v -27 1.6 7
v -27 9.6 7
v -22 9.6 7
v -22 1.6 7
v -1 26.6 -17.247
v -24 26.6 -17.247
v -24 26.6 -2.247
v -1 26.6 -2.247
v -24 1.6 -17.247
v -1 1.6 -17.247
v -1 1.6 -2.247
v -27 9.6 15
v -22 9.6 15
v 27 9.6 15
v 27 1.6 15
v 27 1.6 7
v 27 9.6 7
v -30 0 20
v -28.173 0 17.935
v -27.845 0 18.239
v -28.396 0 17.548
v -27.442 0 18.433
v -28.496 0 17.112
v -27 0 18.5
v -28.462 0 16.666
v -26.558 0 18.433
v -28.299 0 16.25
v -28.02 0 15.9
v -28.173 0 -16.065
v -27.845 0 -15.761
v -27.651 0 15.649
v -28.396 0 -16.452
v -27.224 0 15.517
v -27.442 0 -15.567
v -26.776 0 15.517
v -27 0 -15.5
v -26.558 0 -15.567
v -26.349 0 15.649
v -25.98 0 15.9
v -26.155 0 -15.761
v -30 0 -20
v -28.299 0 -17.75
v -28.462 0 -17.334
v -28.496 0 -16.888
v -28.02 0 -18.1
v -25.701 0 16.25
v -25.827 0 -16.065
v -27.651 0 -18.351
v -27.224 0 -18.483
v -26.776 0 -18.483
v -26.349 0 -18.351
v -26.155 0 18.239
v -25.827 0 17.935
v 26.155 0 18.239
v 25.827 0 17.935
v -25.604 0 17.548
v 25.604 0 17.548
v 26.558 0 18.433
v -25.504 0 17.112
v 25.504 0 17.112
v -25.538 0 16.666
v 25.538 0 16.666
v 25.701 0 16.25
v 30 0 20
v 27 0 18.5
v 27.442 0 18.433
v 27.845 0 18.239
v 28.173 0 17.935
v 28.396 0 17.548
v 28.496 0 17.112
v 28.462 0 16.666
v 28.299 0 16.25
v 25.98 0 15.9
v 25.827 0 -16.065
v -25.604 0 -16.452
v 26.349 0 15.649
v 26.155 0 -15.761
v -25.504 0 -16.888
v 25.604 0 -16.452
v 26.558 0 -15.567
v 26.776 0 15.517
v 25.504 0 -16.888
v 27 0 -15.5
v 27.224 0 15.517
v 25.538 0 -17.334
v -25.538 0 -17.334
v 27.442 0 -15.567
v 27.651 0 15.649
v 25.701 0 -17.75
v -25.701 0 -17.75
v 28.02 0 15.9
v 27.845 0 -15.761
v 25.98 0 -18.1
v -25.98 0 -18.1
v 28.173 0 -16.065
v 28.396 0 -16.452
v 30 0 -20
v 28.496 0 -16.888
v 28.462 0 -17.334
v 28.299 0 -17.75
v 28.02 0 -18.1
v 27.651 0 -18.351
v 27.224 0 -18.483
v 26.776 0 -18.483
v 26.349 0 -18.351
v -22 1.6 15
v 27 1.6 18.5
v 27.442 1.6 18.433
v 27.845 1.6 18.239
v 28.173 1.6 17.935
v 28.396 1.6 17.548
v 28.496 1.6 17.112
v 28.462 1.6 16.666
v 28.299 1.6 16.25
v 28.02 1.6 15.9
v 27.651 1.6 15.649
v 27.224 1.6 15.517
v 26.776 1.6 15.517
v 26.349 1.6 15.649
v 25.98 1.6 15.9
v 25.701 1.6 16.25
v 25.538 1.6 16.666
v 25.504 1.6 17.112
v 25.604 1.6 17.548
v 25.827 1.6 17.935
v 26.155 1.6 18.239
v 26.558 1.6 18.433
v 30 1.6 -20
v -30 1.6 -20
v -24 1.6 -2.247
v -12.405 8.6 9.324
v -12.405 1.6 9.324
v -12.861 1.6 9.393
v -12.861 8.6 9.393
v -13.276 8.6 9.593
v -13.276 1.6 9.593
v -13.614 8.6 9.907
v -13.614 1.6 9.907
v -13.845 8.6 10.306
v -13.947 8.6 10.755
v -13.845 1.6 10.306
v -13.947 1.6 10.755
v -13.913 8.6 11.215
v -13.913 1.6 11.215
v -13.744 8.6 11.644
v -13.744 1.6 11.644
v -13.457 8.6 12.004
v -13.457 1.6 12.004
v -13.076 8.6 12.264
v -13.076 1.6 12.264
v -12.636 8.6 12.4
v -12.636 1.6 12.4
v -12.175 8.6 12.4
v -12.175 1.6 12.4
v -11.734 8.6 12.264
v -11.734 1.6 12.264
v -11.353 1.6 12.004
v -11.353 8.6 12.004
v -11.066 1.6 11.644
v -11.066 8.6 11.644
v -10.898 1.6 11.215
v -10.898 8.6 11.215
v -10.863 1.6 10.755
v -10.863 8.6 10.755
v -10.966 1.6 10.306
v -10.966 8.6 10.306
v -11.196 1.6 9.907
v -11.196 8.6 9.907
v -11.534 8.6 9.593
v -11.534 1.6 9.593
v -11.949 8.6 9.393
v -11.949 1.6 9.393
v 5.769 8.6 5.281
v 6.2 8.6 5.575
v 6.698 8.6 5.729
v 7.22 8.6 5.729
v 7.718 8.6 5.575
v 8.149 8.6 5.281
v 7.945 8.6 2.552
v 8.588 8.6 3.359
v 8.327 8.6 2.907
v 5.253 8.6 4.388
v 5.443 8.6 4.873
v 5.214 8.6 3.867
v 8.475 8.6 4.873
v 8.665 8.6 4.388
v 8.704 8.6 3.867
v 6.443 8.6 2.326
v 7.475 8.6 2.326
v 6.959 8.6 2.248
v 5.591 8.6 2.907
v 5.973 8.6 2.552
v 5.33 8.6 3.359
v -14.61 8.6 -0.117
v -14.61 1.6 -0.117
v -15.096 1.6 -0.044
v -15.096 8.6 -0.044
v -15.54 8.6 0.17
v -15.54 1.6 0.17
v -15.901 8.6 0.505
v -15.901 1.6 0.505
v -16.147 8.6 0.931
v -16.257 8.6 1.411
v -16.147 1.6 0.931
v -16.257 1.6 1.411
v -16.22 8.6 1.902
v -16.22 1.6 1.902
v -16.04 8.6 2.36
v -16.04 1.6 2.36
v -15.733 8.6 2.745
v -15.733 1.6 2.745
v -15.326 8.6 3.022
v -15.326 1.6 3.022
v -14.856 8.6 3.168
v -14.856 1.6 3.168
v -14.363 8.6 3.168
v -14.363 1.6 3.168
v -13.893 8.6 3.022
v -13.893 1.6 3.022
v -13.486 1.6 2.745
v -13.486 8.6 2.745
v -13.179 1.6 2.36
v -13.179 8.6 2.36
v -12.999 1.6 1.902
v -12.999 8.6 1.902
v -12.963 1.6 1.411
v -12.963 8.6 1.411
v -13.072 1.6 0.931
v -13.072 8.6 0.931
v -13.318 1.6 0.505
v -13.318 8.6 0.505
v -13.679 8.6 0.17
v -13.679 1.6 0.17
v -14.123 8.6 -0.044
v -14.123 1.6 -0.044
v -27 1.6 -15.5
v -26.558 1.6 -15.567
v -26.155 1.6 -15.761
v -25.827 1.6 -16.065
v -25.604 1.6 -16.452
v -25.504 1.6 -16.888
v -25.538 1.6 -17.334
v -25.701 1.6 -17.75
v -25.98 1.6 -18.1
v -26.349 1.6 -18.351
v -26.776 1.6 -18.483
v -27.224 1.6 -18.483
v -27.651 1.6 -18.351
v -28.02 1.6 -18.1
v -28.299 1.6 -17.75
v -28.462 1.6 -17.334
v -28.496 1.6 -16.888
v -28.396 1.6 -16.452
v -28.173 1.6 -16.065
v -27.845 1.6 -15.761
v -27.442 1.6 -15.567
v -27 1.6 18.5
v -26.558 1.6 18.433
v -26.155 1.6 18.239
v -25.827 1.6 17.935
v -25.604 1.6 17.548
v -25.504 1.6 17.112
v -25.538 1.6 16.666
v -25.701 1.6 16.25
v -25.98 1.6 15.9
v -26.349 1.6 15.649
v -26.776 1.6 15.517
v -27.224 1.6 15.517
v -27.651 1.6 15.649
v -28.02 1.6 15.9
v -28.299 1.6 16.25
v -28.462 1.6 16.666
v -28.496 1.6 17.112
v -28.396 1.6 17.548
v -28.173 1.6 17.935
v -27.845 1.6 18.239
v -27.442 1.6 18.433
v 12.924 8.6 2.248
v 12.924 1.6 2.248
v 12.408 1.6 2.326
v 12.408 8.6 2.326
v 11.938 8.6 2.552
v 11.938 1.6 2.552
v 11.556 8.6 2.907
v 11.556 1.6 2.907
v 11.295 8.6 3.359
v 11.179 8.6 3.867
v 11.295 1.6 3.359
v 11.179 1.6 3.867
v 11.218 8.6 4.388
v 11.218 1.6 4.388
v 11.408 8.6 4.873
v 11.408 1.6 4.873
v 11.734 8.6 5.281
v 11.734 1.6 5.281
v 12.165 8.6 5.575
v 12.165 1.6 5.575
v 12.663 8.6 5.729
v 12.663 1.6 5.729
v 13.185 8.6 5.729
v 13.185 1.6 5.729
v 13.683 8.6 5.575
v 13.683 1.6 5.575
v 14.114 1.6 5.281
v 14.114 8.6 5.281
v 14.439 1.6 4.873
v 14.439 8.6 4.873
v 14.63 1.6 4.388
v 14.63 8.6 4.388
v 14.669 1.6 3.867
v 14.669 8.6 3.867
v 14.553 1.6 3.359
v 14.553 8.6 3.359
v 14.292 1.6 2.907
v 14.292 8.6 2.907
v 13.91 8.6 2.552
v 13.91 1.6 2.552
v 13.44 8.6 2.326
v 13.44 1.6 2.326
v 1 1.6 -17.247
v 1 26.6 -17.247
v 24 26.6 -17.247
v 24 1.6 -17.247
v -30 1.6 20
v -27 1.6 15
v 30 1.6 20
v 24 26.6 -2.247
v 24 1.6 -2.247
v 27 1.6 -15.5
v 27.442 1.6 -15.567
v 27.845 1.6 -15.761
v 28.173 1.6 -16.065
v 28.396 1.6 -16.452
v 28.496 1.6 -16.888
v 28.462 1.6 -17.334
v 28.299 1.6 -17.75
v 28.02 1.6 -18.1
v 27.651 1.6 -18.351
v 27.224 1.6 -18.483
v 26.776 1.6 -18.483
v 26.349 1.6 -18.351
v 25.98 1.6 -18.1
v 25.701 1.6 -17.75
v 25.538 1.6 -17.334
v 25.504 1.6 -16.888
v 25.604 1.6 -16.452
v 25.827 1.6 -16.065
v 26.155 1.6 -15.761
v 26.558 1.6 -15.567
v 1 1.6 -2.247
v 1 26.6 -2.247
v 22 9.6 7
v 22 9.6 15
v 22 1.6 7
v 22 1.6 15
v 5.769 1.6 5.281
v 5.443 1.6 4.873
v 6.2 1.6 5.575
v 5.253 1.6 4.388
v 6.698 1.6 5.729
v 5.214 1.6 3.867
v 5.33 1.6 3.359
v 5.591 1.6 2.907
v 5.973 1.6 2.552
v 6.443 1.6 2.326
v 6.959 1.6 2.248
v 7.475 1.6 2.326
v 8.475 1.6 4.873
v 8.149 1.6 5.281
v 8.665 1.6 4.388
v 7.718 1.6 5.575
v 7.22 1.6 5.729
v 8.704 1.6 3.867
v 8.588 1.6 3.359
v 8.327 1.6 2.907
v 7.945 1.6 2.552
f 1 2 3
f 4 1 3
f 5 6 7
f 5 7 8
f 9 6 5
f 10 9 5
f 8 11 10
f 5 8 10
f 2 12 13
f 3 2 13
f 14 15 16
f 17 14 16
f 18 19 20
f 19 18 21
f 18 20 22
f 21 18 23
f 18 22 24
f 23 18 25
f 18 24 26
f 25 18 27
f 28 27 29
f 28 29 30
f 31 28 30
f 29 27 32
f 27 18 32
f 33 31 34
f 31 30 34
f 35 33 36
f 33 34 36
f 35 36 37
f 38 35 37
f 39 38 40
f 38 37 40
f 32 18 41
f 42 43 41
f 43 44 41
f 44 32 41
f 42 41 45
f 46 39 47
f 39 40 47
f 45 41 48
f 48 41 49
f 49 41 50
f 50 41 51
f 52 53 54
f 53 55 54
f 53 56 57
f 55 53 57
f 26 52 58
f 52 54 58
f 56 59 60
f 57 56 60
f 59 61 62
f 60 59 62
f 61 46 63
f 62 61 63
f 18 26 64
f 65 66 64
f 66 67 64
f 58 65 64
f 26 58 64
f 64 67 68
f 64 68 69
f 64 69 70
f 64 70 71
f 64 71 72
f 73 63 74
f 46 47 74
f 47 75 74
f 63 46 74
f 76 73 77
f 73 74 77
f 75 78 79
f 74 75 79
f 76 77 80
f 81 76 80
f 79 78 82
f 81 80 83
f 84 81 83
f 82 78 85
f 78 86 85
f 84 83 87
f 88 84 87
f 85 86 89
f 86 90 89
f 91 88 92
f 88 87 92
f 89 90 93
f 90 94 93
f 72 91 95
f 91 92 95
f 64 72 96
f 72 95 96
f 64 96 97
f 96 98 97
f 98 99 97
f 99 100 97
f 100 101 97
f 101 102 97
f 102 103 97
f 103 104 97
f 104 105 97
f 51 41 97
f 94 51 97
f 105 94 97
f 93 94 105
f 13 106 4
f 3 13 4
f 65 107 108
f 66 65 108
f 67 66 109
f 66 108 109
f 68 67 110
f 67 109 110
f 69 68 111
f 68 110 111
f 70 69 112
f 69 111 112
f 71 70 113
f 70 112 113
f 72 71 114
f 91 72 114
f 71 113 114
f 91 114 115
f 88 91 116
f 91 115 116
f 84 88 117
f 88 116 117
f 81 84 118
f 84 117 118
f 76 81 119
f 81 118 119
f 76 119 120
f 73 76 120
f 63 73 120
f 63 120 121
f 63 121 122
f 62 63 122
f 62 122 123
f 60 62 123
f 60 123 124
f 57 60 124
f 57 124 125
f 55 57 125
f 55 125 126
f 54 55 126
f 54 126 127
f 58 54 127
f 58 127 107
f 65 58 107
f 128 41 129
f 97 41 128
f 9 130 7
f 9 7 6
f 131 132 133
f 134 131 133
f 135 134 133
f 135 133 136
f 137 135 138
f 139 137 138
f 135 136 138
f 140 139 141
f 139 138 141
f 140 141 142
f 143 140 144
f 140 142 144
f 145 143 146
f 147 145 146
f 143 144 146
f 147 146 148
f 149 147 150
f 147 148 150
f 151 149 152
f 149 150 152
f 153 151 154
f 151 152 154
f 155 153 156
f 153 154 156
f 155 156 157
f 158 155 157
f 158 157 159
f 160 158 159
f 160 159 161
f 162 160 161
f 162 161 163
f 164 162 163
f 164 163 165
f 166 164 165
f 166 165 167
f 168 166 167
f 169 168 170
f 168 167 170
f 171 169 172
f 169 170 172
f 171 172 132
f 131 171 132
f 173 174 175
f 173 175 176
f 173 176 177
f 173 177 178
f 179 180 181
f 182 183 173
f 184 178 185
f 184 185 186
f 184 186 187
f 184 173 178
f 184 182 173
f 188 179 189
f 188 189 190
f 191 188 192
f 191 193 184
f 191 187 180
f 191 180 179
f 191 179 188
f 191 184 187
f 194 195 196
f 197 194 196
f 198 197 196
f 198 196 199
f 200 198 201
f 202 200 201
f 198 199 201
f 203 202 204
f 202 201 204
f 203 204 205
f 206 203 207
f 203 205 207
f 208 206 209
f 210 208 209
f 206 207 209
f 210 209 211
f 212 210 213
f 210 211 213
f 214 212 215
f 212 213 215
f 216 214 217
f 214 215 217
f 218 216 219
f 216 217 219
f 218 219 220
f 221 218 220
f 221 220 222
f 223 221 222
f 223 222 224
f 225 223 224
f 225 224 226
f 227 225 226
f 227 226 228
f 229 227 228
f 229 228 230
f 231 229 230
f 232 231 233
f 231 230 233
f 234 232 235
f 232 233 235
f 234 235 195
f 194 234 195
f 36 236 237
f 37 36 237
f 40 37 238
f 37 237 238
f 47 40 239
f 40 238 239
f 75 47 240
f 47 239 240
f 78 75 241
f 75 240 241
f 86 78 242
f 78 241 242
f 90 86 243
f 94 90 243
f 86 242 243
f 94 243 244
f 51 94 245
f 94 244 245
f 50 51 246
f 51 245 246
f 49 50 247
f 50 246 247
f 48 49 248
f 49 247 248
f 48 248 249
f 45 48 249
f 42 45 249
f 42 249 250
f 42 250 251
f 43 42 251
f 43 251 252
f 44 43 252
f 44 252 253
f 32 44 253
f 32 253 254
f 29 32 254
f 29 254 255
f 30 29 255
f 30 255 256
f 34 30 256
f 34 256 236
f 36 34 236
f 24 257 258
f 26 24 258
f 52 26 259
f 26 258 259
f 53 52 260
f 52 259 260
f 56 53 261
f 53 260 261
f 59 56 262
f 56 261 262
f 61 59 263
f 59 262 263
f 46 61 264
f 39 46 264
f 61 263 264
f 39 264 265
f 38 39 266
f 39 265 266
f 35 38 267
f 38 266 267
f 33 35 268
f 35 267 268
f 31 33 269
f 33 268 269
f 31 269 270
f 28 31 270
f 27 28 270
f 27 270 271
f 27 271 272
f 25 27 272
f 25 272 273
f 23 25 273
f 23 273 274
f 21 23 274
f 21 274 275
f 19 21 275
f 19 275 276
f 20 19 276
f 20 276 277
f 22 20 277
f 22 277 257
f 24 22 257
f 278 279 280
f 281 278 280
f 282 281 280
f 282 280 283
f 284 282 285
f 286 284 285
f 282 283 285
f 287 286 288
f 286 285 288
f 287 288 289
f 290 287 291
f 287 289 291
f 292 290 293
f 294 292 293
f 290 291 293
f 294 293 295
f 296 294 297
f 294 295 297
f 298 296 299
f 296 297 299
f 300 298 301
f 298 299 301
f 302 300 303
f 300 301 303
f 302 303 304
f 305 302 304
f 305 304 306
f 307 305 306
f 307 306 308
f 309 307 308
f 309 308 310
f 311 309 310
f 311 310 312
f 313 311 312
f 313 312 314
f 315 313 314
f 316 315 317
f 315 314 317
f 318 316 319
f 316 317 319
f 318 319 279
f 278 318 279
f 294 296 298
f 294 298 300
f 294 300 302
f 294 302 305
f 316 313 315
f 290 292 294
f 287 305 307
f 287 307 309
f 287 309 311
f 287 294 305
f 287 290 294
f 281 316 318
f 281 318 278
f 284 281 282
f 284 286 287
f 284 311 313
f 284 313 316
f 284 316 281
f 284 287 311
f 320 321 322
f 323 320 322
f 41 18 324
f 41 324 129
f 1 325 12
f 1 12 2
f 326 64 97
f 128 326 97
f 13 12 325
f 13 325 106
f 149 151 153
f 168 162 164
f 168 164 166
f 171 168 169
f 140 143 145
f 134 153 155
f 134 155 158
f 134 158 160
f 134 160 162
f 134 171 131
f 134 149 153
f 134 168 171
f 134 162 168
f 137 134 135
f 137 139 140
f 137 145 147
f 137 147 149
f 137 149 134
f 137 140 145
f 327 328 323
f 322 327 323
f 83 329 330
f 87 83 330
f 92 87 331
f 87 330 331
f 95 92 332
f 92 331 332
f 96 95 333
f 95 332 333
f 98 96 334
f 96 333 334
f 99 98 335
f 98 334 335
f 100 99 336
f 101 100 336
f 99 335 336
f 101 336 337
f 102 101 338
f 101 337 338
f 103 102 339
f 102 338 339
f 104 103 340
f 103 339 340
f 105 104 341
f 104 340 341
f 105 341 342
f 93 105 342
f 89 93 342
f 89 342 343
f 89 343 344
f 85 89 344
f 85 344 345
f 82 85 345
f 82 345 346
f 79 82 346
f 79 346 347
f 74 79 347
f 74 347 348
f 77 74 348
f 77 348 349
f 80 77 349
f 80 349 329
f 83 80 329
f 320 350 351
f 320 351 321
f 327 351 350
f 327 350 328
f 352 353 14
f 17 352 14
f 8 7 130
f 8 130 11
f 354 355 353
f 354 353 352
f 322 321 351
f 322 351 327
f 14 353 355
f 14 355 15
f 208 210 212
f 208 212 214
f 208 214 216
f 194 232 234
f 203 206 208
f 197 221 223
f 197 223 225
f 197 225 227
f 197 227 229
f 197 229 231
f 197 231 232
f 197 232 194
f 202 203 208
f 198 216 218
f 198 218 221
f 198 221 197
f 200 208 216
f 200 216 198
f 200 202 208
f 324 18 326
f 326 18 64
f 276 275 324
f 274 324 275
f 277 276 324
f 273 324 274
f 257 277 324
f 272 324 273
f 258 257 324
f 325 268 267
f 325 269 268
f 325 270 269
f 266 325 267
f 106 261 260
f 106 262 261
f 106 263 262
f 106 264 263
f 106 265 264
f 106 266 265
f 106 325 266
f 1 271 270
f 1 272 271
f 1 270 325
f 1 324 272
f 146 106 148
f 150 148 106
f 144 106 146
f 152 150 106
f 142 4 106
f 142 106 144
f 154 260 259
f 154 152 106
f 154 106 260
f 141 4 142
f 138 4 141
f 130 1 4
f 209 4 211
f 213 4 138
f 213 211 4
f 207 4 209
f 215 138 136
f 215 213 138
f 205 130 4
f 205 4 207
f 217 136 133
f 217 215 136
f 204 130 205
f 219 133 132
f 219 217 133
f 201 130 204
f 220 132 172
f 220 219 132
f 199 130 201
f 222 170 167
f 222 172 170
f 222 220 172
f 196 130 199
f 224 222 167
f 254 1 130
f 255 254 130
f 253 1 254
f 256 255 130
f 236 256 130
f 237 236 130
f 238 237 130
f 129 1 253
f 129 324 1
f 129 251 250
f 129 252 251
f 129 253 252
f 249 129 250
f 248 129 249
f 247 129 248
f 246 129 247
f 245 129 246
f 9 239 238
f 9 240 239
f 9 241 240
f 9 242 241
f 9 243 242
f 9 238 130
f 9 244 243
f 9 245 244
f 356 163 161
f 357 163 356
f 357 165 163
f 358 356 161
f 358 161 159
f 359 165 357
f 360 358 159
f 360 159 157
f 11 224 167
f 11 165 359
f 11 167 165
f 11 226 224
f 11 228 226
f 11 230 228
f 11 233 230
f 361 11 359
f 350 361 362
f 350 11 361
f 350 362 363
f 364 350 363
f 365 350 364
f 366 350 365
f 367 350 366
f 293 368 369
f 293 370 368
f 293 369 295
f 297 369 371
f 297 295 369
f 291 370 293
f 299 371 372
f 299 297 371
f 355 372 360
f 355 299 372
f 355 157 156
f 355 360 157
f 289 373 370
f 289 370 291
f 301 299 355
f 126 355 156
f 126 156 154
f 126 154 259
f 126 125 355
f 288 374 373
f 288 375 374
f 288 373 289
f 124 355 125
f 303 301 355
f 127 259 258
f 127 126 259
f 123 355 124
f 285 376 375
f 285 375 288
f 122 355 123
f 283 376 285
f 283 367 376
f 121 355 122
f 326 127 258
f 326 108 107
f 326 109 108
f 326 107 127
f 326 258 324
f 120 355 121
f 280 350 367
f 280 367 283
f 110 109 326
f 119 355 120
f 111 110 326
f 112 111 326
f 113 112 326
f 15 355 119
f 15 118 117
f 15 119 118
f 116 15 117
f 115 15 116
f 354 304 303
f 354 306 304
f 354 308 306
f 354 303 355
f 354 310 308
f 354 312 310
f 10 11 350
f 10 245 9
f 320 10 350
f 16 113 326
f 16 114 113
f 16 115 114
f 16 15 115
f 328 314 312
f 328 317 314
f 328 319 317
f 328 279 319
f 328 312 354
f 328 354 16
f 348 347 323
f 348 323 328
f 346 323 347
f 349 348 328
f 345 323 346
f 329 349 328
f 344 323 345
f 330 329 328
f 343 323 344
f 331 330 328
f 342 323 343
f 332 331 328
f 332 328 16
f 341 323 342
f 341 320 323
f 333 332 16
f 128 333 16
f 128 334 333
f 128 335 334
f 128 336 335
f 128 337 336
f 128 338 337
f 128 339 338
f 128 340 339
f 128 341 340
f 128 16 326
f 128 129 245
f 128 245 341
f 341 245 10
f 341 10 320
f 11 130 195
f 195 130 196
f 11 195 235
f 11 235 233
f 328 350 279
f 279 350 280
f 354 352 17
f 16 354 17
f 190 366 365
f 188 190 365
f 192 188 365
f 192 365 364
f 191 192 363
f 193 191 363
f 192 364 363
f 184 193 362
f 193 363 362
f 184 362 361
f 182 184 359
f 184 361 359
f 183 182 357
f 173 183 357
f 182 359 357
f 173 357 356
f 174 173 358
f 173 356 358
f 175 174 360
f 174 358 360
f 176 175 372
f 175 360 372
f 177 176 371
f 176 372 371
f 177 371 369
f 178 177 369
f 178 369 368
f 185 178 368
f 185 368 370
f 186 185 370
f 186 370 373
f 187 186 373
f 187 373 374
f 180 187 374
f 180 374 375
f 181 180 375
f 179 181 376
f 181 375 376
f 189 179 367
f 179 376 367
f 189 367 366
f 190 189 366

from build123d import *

# Parameters (mm, degrees)
SKETCH1_W           = 60
SKETCH1_H           = 40
BOSS_EXTRUDE1_DEPTH = 1.6
SKETCH2_W           = 23
SKETCH2_H           = 15
BOSS_EXTRUDE2_DEPTH = 25
SKETCH3_W           = 5
SKETCH3_H           = 8
BOSS_EXTRUDE3_DEPTH = 8
SKETCH4_R           = 1.651573935
SKETCH4_R_2         = 1.75
SKETCH4_R_3         = 1.546416864
BOSS_EXTRUDE4_DEPTH = 7
CUT_EXTRUDE1_REACH  = 45.875
SKETCH5_R           = 1.5


with BuildPart() as part:
    # Sketch1 → Boss-Extrude1 (new body)
    with BuildSketch(Plane(origin=(0, 0, 0), x_dir=(1, 0, 0), z_dir=(0, 1, 0))):
        Rectangle(SKETCH1_W, SKETCH1_H)
    extrude(amount=BOSS_EXTRUDE1_DEPTH)

    # Sketch2 → Boss-Extrude2 (add)
    with BuildSketch(Plane(origin=(0, 1.6, 0), x_dir=(1, 0, 0), z_dir=(0, 1, 0))):
        with Locations((-12.5, 9.746936541)):
            Rectangle(SKETCH2_W, SKETCH2_H)
        with Locations((12.5, 9.746936541)):
            Rectangle(SKETCH2_W, SKETCH2_H)
    extrude(amount=BOSS_EXTRUDE2_DEPTH)

    # Sketch3 → Boss-Extrude3 (add)
    with BuildSketch(Plane(origin=(0, 1.6, 0), x_dir=(1, 0, 0), z_dir=(0, 1, 0))):
        with Locations((-24.5, -11)):
            Rectangle(SKETCH3_W, SKETCH3_H)
        with Locations((24.5, -11)):
            Rectangle(SKETCH3_W, SKETCH3_H)
    extrude(amount=BOSS_EXTRUDE3_DEPTH)

    # Sketch4 → Boss-Extrude4 (add)
    with BuildSketch(Plane(origin=(0, 1.6, 0), x_dir=(1, 0, 0), z_dir=(0, 1, 0))):
        with Locations(Location((-14.609598895, -1.534440121, 0), (0, 0, 90))):
            Circle(SKETCH4_R)
        with Locations(Location((6.959010124, -3.998189047, 0), (0, 0, 90))):
            Circle(SKETCH4_R_2)
        with Locations(Location((-12.405191961, -10.87075184, 0), (0, 0, 90))):
            Circle(SKETCH4_R_3)
        with Locations(Location((12.923875945, -3.998189047, 0), (0, 0, 90))):
            Circle(SKETCH4_R_2)
    extrude(amount=BOSS_EXTRUDE4_DEPTH)

    # Sketch5 → Cut-Extrude1 (cut, up to next)
    with BuildSketch(Plane(origin=(0, 1.6, 0), x_dir=(1, 0, 0), z_dir=(0, 1, 0)), mode=Mode.PRIVATE) as cut_extrude1_sk1:
        with Locations(Location((-27, 17, 0), (0, 0, 270))):
            Circle(SKETCH5_R)
    cut_extrude1_tool1 = extrude(cut_extrude1_sk1.sketch, amount=-CUT_EXTRUDE1_REACH, mode=Mode.PRIVATE) & part.part
    # Sketch5 → Cut-Extrude1 (cut, up to next)
    with BuildSketch(Plane(origin=(0, 1.6, 0), x_dir=(1, 0, 0), z_dir=(0, 1, 0)), mode=Mode.PRIVATE) as cut_extrude1_sk2:
        with Locations(Location((-27, -17, 0), (0, 0, 270))):
            Circle(SKETCH5_R)
    cut_extrude1_tool2 = extrude(cut_extrude1_sk2.sketch, amount=-CUT_EXTRUDE1_REACH, mode=Mode.PRIVATE) & part.part
    # Sketch5 → Cut-Extrude1 (cut, up to next)
    with BuildSketch(Plane(origin=(0, 1.6, 0), x_dir=(1, 0, 0), z_dir=(0, 1, 0)), mode=Mode.PRIVATE) as cut_extrude1_sk3:
        with Locations(Location((27, -17, 0), (0, 0, 270))):
            Circle(SKETCH5_R)
    cut_extrude1_tool3 = extrude(cut_extrude1_sk3.sketch, amount=-CUT_EXTRUDE1_REACH, mode=Mode.PRIVATE) & part.part
    # Sketch5 → Cut-Extrude1 (cut, up to next)
    with BuildSketch(Plane(origin=(0, 1.6, 0), x_dir=(1, 0, 0), z_dir=(0, 1, 0)), mode=Mode.PRIVATE) as cut_extrude1_sk4:
        with Locations(Location((27, 17, 0), (0, 0, 270))):
            Circle(SKETCH5_R)
    cut_extrude1_tool4 = extrude(cut_extrude1_sk4.sketch, amount=-CUT_EXTRUDE1_REACH, mode=Mode.PRIVATE) & part.part
    add(cut_extrude1_tool1.solids().sort_by_distance((-27, 1.6, -17))[0], mode=Mode.SUBTRACT)
    add(cut_extrude1_tool2.solids().sort_by_distance((-27, 1.6, 17))[0], mode=Mode.SUBTRACT)
    add(cut_extrude1_tool3.solids().sort_by_distance((27, 1.6, 17))[0], mode=Mode.SUBTRACT)
    add(cut_extrude1_tool4.solids().sort_by_distance((27, 1.6, -17))[0], mode=Mode.SUBTRACT)


solid = part.part
